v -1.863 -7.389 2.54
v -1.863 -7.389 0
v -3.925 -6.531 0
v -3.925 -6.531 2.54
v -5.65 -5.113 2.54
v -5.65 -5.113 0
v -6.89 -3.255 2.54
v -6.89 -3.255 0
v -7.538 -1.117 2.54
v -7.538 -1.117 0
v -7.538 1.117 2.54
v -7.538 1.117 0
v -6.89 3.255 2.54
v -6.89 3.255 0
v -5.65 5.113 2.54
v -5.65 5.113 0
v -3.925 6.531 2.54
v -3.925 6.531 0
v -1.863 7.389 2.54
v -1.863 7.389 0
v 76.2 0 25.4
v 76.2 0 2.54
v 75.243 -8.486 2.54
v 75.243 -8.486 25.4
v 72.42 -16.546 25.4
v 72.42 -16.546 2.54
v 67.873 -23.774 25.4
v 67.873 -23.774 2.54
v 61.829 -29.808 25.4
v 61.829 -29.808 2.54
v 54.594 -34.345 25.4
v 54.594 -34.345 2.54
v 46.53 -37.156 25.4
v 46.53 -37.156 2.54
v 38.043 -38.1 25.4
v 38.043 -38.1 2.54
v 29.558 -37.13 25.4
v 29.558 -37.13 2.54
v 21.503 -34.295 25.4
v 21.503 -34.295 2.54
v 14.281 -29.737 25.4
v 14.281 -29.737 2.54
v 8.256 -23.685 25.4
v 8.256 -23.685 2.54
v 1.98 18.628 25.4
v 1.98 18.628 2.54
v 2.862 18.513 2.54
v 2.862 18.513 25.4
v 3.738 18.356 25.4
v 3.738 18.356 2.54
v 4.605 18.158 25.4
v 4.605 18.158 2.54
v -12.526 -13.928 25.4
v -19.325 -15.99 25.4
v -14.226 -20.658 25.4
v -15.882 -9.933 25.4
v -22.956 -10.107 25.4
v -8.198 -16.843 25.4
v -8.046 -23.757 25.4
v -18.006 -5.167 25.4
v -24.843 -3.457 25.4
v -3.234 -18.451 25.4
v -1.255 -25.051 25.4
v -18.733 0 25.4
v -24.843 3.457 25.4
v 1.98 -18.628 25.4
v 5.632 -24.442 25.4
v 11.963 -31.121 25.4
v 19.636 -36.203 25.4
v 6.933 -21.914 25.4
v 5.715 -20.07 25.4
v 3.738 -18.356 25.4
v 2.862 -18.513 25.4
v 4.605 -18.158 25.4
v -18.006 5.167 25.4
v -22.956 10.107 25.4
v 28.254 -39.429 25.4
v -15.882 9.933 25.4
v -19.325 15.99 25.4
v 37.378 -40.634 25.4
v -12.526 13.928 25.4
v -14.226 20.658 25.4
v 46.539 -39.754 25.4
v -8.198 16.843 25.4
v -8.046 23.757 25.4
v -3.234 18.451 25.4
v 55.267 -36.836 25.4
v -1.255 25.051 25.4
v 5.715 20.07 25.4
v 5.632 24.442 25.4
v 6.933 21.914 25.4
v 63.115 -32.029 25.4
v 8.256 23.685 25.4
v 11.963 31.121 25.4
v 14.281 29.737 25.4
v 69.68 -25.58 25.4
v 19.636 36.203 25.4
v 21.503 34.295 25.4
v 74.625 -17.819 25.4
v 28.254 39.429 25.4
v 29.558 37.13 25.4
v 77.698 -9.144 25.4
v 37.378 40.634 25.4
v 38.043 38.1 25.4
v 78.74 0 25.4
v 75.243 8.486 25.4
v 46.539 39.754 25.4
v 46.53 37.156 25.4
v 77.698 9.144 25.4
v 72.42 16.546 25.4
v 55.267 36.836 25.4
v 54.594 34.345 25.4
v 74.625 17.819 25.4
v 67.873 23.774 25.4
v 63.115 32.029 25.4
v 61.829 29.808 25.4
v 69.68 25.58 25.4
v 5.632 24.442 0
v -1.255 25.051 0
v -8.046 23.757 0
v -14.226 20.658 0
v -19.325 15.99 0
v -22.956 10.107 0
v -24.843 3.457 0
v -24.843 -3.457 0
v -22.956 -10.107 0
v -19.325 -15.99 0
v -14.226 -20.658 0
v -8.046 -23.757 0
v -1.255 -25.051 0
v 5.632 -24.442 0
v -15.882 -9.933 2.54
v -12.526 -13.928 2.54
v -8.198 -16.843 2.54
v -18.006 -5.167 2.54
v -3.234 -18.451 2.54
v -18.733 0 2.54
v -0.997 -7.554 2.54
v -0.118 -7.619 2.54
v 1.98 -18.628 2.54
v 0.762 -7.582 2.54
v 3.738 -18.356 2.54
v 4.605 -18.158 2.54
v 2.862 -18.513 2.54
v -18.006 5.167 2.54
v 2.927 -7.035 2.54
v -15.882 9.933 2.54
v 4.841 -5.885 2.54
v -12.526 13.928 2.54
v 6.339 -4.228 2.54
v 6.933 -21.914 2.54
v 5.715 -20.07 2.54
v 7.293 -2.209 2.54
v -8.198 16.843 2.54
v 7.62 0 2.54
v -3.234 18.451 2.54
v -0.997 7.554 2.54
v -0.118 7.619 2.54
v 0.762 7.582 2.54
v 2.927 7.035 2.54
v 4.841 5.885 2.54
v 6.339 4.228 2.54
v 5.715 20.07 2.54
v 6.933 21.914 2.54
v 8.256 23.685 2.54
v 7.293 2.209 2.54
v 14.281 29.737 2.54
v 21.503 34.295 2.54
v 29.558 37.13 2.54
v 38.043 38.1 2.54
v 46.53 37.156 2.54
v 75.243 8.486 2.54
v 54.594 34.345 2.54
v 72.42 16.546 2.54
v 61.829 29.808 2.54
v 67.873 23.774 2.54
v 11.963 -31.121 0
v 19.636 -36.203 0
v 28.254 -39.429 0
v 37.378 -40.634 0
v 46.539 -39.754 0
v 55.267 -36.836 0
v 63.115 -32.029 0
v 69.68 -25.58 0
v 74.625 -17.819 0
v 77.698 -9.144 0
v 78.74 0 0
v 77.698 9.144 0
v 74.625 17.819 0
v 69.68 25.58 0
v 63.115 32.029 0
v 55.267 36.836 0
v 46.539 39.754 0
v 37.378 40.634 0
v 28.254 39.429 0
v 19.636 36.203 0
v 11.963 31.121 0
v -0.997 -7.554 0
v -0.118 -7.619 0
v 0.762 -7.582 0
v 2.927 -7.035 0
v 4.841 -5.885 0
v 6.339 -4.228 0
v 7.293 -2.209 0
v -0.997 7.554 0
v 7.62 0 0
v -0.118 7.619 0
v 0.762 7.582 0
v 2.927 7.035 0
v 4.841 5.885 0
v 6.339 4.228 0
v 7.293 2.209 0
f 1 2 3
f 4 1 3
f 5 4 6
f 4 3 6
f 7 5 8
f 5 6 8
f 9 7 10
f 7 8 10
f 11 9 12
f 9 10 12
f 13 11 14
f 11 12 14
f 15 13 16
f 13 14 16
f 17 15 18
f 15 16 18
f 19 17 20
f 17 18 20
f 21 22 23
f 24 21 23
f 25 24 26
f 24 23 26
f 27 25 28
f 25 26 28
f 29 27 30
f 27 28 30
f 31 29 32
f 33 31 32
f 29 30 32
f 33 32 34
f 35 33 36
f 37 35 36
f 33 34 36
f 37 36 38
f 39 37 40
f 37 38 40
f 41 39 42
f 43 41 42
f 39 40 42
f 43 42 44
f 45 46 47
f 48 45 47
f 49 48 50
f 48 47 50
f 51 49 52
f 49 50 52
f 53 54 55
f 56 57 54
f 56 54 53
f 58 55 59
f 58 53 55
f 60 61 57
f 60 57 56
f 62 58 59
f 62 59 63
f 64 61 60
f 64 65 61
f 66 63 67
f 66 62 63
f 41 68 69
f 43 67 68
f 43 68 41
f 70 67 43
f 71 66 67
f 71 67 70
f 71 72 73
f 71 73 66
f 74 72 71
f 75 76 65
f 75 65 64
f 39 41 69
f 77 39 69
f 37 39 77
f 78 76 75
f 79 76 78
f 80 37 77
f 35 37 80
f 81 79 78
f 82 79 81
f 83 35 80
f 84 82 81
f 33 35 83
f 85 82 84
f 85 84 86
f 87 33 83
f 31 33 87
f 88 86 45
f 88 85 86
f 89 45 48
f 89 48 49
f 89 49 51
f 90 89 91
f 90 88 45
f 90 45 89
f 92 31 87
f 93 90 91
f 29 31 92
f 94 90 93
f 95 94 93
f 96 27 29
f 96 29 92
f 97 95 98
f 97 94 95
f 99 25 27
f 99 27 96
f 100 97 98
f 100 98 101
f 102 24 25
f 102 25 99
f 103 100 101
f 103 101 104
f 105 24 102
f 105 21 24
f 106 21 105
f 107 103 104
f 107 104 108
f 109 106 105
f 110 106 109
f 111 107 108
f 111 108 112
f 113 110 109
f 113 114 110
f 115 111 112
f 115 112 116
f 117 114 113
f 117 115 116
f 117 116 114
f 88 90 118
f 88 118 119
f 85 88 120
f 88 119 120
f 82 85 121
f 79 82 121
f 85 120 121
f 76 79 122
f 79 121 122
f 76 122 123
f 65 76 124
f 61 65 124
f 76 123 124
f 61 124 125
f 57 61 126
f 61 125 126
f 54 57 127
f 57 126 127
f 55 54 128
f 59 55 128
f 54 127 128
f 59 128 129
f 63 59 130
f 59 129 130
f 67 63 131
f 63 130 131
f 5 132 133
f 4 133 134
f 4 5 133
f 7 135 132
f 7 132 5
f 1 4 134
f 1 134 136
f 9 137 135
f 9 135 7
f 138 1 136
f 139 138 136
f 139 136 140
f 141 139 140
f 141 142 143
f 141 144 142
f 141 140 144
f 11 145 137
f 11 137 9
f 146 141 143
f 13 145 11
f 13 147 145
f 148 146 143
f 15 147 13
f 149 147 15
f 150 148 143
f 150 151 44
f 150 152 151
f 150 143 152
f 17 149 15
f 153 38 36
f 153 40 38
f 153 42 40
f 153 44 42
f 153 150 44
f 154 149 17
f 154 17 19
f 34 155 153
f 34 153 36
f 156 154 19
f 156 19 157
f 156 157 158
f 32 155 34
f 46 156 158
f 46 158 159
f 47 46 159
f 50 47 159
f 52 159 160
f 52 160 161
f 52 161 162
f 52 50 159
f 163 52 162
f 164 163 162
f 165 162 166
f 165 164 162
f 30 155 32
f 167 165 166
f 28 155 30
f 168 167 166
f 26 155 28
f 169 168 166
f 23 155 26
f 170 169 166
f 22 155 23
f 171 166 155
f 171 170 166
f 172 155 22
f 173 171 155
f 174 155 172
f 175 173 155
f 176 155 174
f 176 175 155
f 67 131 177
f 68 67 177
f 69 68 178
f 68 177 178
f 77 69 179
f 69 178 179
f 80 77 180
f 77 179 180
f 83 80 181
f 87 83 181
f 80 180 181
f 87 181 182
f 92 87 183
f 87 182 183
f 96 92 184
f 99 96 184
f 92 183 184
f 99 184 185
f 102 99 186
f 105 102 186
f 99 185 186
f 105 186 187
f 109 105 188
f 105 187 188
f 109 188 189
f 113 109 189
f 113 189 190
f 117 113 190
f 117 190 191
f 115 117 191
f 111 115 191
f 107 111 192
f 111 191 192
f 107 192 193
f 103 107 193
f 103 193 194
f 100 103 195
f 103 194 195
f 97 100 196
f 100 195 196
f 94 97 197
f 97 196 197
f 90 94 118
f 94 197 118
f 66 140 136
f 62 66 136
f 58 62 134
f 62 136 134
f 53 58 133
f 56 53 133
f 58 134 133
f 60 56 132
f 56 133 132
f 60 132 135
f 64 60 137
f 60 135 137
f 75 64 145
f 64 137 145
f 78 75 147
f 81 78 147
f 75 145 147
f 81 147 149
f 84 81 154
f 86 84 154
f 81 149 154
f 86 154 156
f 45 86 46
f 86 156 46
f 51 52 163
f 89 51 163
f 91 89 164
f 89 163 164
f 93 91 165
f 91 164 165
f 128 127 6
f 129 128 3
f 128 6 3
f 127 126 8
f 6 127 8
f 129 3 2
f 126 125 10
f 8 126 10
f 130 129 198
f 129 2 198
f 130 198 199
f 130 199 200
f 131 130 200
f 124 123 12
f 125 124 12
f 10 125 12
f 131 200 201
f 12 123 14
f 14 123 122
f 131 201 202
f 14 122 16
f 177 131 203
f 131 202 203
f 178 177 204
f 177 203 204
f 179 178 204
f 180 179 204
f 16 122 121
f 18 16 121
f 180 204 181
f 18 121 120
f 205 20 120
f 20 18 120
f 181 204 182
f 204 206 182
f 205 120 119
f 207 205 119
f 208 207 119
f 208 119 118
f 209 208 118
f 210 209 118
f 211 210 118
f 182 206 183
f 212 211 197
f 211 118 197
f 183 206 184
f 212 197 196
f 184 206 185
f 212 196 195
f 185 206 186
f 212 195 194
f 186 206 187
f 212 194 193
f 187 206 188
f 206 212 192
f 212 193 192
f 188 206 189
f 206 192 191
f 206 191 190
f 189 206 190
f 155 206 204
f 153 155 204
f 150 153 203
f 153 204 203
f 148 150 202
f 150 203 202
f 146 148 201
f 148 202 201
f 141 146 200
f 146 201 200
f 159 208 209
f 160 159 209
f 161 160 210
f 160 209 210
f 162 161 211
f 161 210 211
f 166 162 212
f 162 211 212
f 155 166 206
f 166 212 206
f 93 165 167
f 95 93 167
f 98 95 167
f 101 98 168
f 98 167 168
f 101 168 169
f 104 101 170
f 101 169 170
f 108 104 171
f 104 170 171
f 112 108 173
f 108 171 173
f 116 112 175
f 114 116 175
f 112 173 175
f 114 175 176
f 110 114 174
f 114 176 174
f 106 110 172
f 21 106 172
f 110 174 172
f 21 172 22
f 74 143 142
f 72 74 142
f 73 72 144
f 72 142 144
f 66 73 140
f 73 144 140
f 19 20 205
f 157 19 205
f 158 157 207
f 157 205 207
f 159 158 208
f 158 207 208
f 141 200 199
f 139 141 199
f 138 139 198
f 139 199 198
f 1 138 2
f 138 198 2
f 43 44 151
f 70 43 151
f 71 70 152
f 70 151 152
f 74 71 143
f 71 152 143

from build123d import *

# Parameters (mm, degrees)
F0_R     = 6.35
F1_DEPTH = 2.54
F2_DEPTH = 25.4


with BuildPart() as f1:
    # F0 (on Top) → F1 (new body)
    with BuildSketch(Plane.XY):
        with BuildLine():
            ThreePointArc((1.98040625, 18.6275212343), (3.3011106094, 18.4393390607), (4.6050729167, 18.157639155))
            ThreePointArc((4.6050729167, 18.157639155), (6.310350892, 21.0006716461), (8.2563229167, 23.6846983968))
            ThreePointArc((8.2563229167, 23.6846983968), (6.9543084231, 24.0991576742), (5.63165625, 24.4421000352))
            ThreePointArc((5.63165625, 24.4421000352), (3.6830183734, 21.6120562584), (1.98040625, 18.6275212343))
        make_face()
        with BuildLine():
            ThreePointArc((8.2563229167, -23.6846983968), (6.310350892, -21.0006716461), (4.6050729167, -18.157639155))
            ThreePointArc((4.6050729167, -18.157639155), (3.3011106094, -18.4393390607), (1.98040625, -18.6275212343))
            ThreePointArc((1.98040625, -18.6275212343), (3.6830183734, -21.6120562584), (5.63165625, -24.4421000352))
            ThreePointArc((5.63165625, -24.4421000352), (6.9543084231, -24.0991576742), (8.2563229167, -23.6846983968))
        make_face()
        with BuildLine():
            ThreePointArc((1.98040625, -18.6275212343), (-18.7325, 0), (1.98040625, 18.6275212343))
            ThreePointArc((1.98040625, 18.6275212343), (3.6830183734, 21.6120562584), (5.63165625, 24.4421000352))
            ThreePointArc((5.63165625, 24.4421000352), (-25.0825, 0), (5.63165625, -24.4421000352))
            ThreePointArc((5.63165625, -24.4421000352), (3.6830183734, -21.6120562584), (1.98040625, -18.6275212343))
        make_face()
        with BuildLine():
            ThreePointArc((5.63165625, 24.4421000352), (6.9543084231, 24.0991576742), (8.2563229167, 23.6846983968))
            ThreePointArc((8.2563229167, 23.6846983968), (50.64125, 35.9767570584), (76.2, 0))
            ThreePointArc((76.2, 0), (50.64125, -35.9767570584), (8.2563229167, -23.6846983968))
            ThreePointArc((8.2563229167, -23.6846983968), (6.9543084231, -24.0991576742), (5.63165625, -24.4421000352))
            ThreePointArc((5.63165625, -24.4421000352), (50.9859634875, -38.5429830838), (78.74, 0))
            ThreePointArc((78.74, 0), (50.9859634875, 38.5429830838), (5.63165625, 24.4421000352))
        make_face()
        with BuildLine():
            ThreePointArc((-1.8626666667, 7.388834339), (-0.3539283859, 13.1493342679), (1.98040625, 18.6275212343))
            ThreePointArc((1.98040625, 18.6275212343), (-18.7325, 0), (1.98040625, -18.6275212343))
            ThreePointArc((1.98040625, -18.6275212343), (-0.3539283859, -13.1493342679), (-1.8626666667, -7.388834339))
            ThreePointArc((-1.8626666667, -7.388834339), (-7.62, 0), (-1.8626666667, 7.388834339))
        make_face()
        with BuildLine():
            ThreePointArc((0.762, 7.5818042708), (2.2909514135, 13.012380233), (4.6050729167, 18.157639155))
            ThreePointArc((4.6050729167, 18.157639155), (3.3011106094, 18.4393390607), (1.98040625, 18.6275212343))
            ThreePointArc((1.98040625, 18.6275212343), (-0.3539283859, 13.1493342679), (-1.8626666667, 7.388834339))
            ThreePointArc((-1.8626666667, 7.388834339), (-0.5587272379, 7.5994883955), (0.762, 7.5818042708))
        make_face()
        with BuildLine():
            ThreePointArc((4.6050729167, -18.157639155), (14.7846387284, -11.5030871473), (18.7325, 0))
            ThreePointArc((18.7325, 0), (14.7846387284, 11.5030871473), (4.6050729167, 18.157639155))
            ThreePointArc((4.6050729167, 18.157639155), (2.2909514135, 13.012380233), (0.762, 7.5818042708))
            ThreePointArc((0.762, 7.5818042708), (5.6511432472, 5.1116513966), (7.62, 0))
            ThreePointArc((7.62, 0), (5.6511432472, -5.1116513966), (0.762, -7.5818042708))
            ThreePointArc((0.762, -7.5818042708), (2.2909514135, -13.012380233), (4.6050729167, -18.157639155))
        make_face()
        with BuildLine():
            ThreePointArc((1.98040625, -18.6275212343), (3.3011106094, -18.4393390607), (4.6050729167, -18.157639155))
            ThreePointArc((4.6050729167, -18.157639155), (2.2909514135, -13.012380233), (0.762, -7.5818042708))
            ThreePointArc((0.762, -7.5818042708), (-0.5587272379, -7.5994883955), (-1.8626666667, -7.388834339))
            ThreePointArc((-1.8626666667, -7.388834339), (-0.3539283859, -13.1493342679), (1.98040625, -18.6275212343))
        make_face()
        with BuildLine():
            ThreePointArc((4.6050729167, 18.157639155), (14.7846387284, 11.5030871473), (18.7325, 0))
            ThreePointArc((18.7325, 0), (14.7846387284, -11.5030871473), (4.6050729167, -18.157639155))
            ThreePointArc((4.6050729167, -18.157639155), (6.310350892, -21.0006716461), (8.2563229167, -23.6846983968))
            ThreePointArc((8.2563229167, -23.6846983968), (20.4477508031, -14.5265719751), (25.0825, 0))
            ThreePointArc((25.0825, 0), (20.4477508031, 14.5265719751), (8.2563229167, 23.6846983968))
            ThreePointArc((8.2563229167, 23.6846983968), (6.310350892, 21.0006716461), (4.6050729167, 18.157639155))
        make_face()
        with BuildLine():
            ThreePointArc((76.2, 0), (50.64125, 35.9767570584), (8.2563229167, 23.6846983968))
            ThreePointArc((8.2563229167, 23.6846983968), (20.4477508031, 14.5265719751), (25.0825, 0))
            ThreePointArc((25.0825, 0), (20.4477508031, -14.5265719751), (8.2563229167, -23.6846983968))
            ThreePointArc((8.2563229167, -23.6846983968), (50.64125, -35.9767570584), (76.2, 0))
        make_face()
        with Locations((38.1, 0)):
            Circle(F0_R, mode=Mode.SUBTRACT)
        with Locations((38.1, 0)):
            Circle(F0_R)
    extrude(amount=F1_DEPTH)

    # F0 (on Top) → F2 (join)
    with BuildSketch(Plane.XY):
        with BuildLine():
            ThreePointArc((5.63165625, 24.4421000352), (6.9543084231, 24.0991576742), (8.2563229167, 23.6846983968))
            ThreePointArc((8.2563229167, 23.6846983968), (50.64125, 35.9767570584), (76.2, 0))
            ThreePointArc((76.2, 0), (50.64125, -35.9767570584), (8.2563229167, -23.6846983968))
            ThreePointArc((8.2563229167, -23.6846983968), (6.9543084231, -24.0991576742), (5.63165625, -24.4421000352))
            ThreePointArc((5.63165625, -24.4421000352), (50.9859634875, -38.5429830838), (78.74, 0))
            ThreePointArc((78.74, 0), (50.9859634875, 38.5429830838), (5.63165625, 24.4421000352))
        make_face()
        with BuildLine():
            ThreePointArc((1.98040625, 18.6275212343), (3.3011106094, 18.4393390607), (4.6050729167, 18.157639155))
            ThreePointArc((4.6050729167, 18.157639155), (6.310350892, 21.0006716461), (8.2563229167, 23.6846983968))
            ThreePointArc((8.2563229167, 23.6846983968), (6.9543084231, 24.0991576742), (5.63165625, 24.4421000352))
            ThreePointArc((5.63165625, 24.4421000352), (3.6830183734, 21.6120562584), (1.98040625, 18.6275212343))
        make_face()
        with BuildLine():
            ThreePointArc((1.98040625, -18.6275212343), (-18.7325, 0), (1.98040625, 18.6275212343))
            ThreePointArc((1.98040625, 18.6275212343), (3.6830183734, 21.6120562584), (5.63165625, 24.4421000352))
            ThreePointArc((5.63165625, 24.4421000352), (-25.0825, 0), (5.63165625, -24.4421000352))
            ThreePointArc((5.63165625, -24.4421000352), (3.6830183734, -21.6120562584), (1.98040625, -18.6275212343))
        make_face()
        with BuildLine():
            ThreePointArc((8.2563229167, -23.6846983968), (6.310350892, -21.0006716461), (4.6050729167, -18.157639155))
            ThreePointArc((4.6050729167, -18.157639155), (3.3011106094, -18.4393390607), (1.98040625, -18.6275212343))
            ThreePointArc((1.98040625, -18.6275212343), (3.6830183734, -21.6120562584), (5.63165625, -24.4421000352))
            ThreePointArc((5.63165625, -24.4421000352), (6.9543084231, -24.0991576742), (8.2563229167, -23.6846983968))
        make_face()
    extrude(amount=F2_DEPTH)


solid = f1.part
